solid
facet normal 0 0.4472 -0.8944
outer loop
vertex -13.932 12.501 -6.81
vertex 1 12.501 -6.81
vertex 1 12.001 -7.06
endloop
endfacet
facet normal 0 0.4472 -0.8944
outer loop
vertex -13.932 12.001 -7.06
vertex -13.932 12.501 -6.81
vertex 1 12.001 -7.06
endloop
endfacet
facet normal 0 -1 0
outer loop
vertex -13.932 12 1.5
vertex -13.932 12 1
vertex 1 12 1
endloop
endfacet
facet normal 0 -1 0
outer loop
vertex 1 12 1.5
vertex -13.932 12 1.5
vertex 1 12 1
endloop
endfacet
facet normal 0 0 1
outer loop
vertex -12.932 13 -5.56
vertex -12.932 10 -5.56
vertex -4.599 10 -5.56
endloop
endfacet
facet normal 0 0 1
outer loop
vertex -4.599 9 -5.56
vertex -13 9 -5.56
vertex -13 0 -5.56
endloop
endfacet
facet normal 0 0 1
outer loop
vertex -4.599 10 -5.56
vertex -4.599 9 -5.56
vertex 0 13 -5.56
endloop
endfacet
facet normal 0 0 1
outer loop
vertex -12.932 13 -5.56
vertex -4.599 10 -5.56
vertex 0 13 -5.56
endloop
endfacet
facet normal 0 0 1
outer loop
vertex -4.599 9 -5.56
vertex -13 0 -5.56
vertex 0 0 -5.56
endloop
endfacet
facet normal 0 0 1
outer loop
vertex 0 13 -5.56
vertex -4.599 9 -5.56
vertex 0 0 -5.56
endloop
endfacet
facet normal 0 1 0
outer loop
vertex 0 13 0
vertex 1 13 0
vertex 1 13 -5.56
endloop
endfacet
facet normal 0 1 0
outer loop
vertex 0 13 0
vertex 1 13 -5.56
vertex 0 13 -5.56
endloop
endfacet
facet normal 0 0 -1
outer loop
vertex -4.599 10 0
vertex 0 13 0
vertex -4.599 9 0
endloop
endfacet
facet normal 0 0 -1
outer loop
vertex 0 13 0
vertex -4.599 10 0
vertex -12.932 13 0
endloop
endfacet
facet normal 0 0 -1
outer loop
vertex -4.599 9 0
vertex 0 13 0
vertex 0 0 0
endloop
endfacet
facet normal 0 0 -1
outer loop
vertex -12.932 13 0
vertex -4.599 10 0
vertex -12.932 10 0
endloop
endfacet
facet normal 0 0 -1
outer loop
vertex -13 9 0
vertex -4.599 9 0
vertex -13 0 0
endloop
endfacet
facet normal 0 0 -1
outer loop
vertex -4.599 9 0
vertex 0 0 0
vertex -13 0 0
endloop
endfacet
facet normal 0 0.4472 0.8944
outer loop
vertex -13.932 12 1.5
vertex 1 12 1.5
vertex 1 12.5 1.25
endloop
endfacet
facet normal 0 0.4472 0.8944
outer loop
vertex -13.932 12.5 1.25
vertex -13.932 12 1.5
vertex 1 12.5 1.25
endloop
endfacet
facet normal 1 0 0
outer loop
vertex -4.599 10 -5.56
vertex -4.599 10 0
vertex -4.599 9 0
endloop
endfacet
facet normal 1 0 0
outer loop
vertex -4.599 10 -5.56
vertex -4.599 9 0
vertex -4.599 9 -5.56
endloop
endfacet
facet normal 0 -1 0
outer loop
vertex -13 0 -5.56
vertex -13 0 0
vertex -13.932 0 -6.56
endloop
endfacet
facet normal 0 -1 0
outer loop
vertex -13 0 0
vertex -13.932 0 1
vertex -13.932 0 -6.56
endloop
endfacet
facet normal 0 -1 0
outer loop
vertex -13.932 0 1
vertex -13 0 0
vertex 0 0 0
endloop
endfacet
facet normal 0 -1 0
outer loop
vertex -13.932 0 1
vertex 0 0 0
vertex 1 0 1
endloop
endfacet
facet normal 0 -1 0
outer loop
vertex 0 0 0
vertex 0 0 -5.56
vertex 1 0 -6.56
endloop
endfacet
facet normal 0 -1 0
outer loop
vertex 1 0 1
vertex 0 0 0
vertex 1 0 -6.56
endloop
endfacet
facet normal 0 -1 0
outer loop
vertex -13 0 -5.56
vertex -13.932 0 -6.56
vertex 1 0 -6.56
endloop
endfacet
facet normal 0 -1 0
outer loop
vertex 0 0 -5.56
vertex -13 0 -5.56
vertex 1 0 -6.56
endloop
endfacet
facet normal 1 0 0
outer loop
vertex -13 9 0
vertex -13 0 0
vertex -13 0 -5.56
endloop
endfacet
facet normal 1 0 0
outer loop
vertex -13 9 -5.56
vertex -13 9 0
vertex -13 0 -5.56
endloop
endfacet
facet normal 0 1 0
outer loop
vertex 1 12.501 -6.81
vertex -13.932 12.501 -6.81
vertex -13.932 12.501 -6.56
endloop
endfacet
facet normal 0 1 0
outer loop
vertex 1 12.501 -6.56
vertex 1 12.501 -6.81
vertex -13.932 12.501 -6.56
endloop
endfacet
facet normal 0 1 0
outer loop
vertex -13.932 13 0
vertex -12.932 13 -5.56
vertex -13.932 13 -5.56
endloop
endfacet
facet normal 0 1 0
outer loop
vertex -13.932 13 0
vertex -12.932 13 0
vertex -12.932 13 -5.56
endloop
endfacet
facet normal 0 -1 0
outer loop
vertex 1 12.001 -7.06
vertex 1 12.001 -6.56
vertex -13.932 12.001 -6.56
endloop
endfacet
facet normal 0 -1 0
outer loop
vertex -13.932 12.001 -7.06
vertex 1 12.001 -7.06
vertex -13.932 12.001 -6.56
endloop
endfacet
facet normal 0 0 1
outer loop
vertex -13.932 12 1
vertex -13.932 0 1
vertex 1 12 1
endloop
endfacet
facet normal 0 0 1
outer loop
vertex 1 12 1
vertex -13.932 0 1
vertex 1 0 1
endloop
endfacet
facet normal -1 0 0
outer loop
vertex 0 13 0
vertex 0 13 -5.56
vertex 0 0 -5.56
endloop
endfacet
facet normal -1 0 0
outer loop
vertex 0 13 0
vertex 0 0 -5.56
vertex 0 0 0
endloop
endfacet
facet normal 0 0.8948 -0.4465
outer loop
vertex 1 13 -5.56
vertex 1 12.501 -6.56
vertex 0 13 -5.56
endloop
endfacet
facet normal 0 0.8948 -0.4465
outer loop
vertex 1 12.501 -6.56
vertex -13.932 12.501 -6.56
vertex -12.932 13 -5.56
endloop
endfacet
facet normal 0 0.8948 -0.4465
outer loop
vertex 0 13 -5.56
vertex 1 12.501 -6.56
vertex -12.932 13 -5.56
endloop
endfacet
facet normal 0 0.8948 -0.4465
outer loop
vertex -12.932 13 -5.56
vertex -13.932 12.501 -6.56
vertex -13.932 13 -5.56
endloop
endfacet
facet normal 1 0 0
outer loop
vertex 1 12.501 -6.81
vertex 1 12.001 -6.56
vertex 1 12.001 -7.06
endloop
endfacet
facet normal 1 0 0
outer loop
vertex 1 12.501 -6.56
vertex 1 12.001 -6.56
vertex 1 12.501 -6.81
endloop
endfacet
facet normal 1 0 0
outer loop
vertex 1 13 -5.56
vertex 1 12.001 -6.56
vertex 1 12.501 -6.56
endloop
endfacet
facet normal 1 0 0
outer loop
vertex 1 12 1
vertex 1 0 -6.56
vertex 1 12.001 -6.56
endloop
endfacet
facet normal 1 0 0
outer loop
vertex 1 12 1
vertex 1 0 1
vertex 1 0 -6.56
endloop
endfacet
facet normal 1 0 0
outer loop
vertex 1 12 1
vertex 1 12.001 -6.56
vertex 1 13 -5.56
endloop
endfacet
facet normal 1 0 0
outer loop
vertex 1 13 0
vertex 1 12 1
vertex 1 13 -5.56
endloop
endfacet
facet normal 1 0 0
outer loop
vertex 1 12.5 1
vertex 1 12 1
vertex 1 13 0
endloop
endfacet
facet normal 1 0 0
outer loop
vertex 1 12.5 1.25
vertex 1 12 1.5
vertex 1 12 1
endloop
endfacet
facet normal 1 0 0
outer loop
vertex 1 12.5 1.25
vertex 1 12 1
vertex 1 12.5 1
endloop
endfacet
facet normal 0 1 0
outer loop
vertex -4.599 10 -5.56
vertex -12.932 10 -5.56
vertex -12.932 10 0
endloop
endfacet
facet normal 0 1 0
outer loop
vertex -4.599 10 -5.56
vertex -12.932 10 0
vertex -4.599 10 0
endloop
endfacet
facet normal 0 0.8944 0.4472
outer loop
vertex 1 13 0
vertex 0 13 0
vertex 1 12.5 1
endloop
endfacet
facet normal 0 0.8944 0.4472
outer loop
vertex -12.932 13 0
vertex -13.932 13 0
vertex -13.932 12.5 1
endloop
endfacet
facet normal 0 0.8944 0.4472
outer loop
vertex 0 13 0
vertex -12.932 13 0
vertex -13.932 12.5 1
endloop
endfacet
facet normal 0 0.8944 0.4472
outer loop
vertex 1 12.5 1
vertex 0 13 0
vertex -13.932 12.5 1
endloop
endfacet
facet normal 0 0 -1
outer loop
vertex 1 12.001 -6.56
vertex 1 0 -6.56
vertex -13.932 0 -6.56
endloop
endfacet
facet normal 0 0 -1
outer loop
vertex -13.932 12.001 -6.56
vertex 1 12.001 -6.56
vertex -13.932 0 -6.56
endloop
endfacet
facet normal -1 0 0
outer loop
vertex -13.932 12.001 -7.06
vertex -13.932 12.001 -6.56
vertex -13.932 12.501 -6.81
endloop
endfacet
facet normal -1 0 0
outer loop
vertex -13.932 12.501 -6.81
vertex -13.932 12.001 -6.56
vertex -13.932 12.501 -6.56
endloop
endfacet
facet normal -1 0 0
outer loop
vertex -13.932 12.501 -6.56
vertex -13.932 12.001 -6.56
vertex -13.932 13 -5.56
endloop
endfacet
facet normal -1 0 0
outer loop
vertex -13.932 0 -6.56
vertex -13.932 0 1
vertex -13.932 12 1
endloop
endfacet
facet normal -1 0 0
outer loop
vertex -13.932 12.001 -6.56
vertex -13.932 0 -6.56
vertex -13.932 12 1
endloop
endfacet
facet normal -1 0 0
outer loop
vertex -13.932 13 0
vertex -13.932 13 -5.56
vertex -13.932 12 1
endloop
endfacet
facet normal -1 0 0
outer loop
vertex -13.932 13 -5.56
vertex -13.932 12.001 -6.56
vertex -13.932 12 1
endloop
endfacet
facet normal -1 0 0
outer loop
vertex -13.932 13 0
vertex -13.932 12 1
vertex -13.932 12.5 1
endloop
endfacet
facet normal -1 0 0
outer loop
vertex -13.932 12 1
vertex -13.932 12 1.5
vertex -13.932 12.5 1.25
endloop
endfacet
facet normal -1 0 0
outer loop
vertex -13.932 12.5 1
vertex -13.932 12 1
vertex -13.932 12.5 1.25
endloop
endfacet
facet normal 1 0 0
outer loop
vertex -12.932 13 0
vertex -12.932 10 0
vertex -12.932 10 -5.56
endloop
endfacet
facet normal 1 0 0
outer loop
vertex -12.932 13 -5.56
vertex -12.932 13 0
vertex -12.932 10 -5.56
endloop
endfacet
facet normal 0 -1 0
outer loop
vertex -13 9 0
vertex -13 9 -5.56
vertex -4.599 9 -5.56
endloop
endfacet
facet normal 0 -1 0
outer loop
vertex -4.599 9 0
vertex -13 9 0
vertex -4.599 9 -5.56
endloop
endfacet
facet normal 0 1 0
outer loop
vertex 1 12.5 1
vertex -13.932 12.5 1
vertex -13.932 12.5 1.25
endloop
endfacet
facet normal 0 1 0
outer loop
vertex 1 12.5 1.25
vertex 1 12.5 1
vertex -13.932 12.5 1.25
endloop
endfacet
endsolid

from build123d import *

# Parameters (mm, degrees)
BOSS_EXTRUDE1_DEPTH = 10
SKETCH2_W           = 1.866494487
SKETCH2_H           = 2.78
SKETCH2_H_2         = 1
BOSS_EXTRUDE2_DEPTH = 1
BOSS_EXTRUDE3_DEPTH = 3
SKETCH4_W           = 14.931955898
SKETCH4_H           = 1
BOSS_EXTRUDE4_DEPTH = 1
SKETCH5_W           = 14.931955898
SKETCH5_H           = 0.998682686
BOSS_EXTRUDE5_DEPTH = 1
CUT_EXTRUDE1_DEPTH  = 15
CUT_EXTRUDE2_DEPTH  = 15
CUT_EXTRUDE3_DEPTH  = 15


with BuildPart() as part:
    # Sketch1 → Boss-Extrude1 (new body)
    with BuildSketch(Plane(origin=(0, 0, 0), x_dir=(1, 0, 0), z_dir=(0, 1, 0))):
        Polygon((-13.931955898, 6.56), (-13.931955898, -1), (-13, -1), (-13, 0), (-13, 5.56), (0, 5.56), (0, 0), (1, 0), (1, 5.56), (1, 6.56), (-12.931955898, 6.56), align=None)
        Polygon((0, -1), (1, -1), (1, 0), (0, 0), (-13, 0), (-13, -1), align=None)
    extrude(amount=BOSS_EXTRUDE1_DEPTH)

    # Sketch2 → Boss-Extrude2 (add)
    with BuildSketch(Plane(origin=(0, 10, 0), x_dir=(1, 0, 0), z_dir=(0, 1, 0))):
        Polygon((-13, 0), (-6.465977949, 0), (-6.465977949, 2.78), (-6.465977949, 5.56), (-13, 5.56), align=None)
        with Locations((-5.532730706, 4.17)):
            Rectangle(SKETCH2_W, SKETCH2_H)
        with Locations((-5.532730706, 1.39)):
            Rectangle(SKETCH2_W, SKETCH2_H)
        Polygon((-13.931955898, -1), (-6.465977949, -1), (-6.465977949, 0), (-13, 0), (-13, 5.56), (-6.465977949, 5.56), (-6.465977949, 6.56), (-13.931955898, 6.56), align=None)
        with Locations((-5.532730706, -0.5)):
            Rectangle(SKETCH2_W, SKETCH2_H_2)
        with Locations((-5.532730706, 6.06)):
            Rectangle(SKETCH2_W, SKETCH2_H_2)
    extrude(amount=-BOSS_EXTRUDE2_DEPTH)

    # Sketch3 → Boss-Extrude3 (add)
    with BuildSketch(Plane(origin=(0, 10, 0), x_dir=(1, 0, 0), z_dir=(0, 1, 0))):
        Polygon((1, 6.56), (-12.931955898, 6.56), (-12.931955898, 5.56), (-4.599483462, 5.56), (0, 5.56), (0, 0), (-4.599483462, 0), (-12.931955898, 0), (-12.931955898, -1), (1, -1), align=None)
        Polygon((-12.931955898, 6.56), (-13.931955898, 6.56), (-13.931955898, -1), (-12.931955898, -1), (-12.931955898, 0), (-12.931955898, 5.56), align=None)
    extrude(amount=BOSS_EXTRUDE3_DEPTH)

    # Sketch4 → Boss-Extrude4 (add)
    with BuildSketch(Plane.XY.offset(1)):
        with Locations((-6.465977949, 12.5)):
            Rectangle(SKETCH4_W, SKETCH4_H)
    extrude(amount=BOSS_EXTRUDE4_DEPTH)

    # Sketch5 → Boss-Extrude5 (add)
    with BuildSketch(Plane(origin=(0, 0, -6.56), x_dir=(-1, 0, 0), z_dir=(0, 0, -1))):
        with Locations((6.465977949, 12.500658657)):
            Rectangle(SKETCH5_W, SKETCH5_H)
    extrude(amount=BOSS_EXTRUDE5_DEPTH)

    # Sketch6 → Cut-Extrude1 (cut)
    with BuildSketch(Plane.ZY.offset(13.931955898)):
        Polygon((-7.56, 12.001317314), (-6.56, 13), (-7.56, 13), align=None)
        Polygon((1, 13), (2, 12), (2, 13), align=None)
    extrude(amount=-CUT_EXTRUDE1_DEPTH, mode=Mode.SUBTRACT)

    # Sketch7 → Cut-Extrude2 (cut)
    with BuildSketch(Plane(origin=(1, 0, 0), x_dir=(0, 0, -1), z_dir=(1, 0, 0))):
        Polygon((-1.5, 12), (-1, 13), (-2, 12), align=None)
        Polygon((7.56, 12.001317314), (6.56, 13), (7.06, 12.001317314), align=None)
    extrude(amount=-CUT_EXTRUDE2_DEPTH, mode=Mode.SUBTRACT)

    # Sketch12 → Cut-Extrude3 (cut)
    with BuildSketch(Plane.ZY.offset(13.931955898)):
        Polygon((-6.81, 12.500658657), (-6.56, 12.500658657), (-6.56, 13), align=None)
        Polygon((-6.56, 13), (-6.56, 12.500658657), (-5.56, 13), align=None)
        Polygon((1.25, 12.5), (1, 13), (1, 12.5), align=None)
        Polygon((1, 12.5), (1, 13), (0, 13), align=None)
    extrude(amount=-CUT_EXTRUDE3_DEPTH, mode=Mode.SUBTRACT)


solid = part.part
